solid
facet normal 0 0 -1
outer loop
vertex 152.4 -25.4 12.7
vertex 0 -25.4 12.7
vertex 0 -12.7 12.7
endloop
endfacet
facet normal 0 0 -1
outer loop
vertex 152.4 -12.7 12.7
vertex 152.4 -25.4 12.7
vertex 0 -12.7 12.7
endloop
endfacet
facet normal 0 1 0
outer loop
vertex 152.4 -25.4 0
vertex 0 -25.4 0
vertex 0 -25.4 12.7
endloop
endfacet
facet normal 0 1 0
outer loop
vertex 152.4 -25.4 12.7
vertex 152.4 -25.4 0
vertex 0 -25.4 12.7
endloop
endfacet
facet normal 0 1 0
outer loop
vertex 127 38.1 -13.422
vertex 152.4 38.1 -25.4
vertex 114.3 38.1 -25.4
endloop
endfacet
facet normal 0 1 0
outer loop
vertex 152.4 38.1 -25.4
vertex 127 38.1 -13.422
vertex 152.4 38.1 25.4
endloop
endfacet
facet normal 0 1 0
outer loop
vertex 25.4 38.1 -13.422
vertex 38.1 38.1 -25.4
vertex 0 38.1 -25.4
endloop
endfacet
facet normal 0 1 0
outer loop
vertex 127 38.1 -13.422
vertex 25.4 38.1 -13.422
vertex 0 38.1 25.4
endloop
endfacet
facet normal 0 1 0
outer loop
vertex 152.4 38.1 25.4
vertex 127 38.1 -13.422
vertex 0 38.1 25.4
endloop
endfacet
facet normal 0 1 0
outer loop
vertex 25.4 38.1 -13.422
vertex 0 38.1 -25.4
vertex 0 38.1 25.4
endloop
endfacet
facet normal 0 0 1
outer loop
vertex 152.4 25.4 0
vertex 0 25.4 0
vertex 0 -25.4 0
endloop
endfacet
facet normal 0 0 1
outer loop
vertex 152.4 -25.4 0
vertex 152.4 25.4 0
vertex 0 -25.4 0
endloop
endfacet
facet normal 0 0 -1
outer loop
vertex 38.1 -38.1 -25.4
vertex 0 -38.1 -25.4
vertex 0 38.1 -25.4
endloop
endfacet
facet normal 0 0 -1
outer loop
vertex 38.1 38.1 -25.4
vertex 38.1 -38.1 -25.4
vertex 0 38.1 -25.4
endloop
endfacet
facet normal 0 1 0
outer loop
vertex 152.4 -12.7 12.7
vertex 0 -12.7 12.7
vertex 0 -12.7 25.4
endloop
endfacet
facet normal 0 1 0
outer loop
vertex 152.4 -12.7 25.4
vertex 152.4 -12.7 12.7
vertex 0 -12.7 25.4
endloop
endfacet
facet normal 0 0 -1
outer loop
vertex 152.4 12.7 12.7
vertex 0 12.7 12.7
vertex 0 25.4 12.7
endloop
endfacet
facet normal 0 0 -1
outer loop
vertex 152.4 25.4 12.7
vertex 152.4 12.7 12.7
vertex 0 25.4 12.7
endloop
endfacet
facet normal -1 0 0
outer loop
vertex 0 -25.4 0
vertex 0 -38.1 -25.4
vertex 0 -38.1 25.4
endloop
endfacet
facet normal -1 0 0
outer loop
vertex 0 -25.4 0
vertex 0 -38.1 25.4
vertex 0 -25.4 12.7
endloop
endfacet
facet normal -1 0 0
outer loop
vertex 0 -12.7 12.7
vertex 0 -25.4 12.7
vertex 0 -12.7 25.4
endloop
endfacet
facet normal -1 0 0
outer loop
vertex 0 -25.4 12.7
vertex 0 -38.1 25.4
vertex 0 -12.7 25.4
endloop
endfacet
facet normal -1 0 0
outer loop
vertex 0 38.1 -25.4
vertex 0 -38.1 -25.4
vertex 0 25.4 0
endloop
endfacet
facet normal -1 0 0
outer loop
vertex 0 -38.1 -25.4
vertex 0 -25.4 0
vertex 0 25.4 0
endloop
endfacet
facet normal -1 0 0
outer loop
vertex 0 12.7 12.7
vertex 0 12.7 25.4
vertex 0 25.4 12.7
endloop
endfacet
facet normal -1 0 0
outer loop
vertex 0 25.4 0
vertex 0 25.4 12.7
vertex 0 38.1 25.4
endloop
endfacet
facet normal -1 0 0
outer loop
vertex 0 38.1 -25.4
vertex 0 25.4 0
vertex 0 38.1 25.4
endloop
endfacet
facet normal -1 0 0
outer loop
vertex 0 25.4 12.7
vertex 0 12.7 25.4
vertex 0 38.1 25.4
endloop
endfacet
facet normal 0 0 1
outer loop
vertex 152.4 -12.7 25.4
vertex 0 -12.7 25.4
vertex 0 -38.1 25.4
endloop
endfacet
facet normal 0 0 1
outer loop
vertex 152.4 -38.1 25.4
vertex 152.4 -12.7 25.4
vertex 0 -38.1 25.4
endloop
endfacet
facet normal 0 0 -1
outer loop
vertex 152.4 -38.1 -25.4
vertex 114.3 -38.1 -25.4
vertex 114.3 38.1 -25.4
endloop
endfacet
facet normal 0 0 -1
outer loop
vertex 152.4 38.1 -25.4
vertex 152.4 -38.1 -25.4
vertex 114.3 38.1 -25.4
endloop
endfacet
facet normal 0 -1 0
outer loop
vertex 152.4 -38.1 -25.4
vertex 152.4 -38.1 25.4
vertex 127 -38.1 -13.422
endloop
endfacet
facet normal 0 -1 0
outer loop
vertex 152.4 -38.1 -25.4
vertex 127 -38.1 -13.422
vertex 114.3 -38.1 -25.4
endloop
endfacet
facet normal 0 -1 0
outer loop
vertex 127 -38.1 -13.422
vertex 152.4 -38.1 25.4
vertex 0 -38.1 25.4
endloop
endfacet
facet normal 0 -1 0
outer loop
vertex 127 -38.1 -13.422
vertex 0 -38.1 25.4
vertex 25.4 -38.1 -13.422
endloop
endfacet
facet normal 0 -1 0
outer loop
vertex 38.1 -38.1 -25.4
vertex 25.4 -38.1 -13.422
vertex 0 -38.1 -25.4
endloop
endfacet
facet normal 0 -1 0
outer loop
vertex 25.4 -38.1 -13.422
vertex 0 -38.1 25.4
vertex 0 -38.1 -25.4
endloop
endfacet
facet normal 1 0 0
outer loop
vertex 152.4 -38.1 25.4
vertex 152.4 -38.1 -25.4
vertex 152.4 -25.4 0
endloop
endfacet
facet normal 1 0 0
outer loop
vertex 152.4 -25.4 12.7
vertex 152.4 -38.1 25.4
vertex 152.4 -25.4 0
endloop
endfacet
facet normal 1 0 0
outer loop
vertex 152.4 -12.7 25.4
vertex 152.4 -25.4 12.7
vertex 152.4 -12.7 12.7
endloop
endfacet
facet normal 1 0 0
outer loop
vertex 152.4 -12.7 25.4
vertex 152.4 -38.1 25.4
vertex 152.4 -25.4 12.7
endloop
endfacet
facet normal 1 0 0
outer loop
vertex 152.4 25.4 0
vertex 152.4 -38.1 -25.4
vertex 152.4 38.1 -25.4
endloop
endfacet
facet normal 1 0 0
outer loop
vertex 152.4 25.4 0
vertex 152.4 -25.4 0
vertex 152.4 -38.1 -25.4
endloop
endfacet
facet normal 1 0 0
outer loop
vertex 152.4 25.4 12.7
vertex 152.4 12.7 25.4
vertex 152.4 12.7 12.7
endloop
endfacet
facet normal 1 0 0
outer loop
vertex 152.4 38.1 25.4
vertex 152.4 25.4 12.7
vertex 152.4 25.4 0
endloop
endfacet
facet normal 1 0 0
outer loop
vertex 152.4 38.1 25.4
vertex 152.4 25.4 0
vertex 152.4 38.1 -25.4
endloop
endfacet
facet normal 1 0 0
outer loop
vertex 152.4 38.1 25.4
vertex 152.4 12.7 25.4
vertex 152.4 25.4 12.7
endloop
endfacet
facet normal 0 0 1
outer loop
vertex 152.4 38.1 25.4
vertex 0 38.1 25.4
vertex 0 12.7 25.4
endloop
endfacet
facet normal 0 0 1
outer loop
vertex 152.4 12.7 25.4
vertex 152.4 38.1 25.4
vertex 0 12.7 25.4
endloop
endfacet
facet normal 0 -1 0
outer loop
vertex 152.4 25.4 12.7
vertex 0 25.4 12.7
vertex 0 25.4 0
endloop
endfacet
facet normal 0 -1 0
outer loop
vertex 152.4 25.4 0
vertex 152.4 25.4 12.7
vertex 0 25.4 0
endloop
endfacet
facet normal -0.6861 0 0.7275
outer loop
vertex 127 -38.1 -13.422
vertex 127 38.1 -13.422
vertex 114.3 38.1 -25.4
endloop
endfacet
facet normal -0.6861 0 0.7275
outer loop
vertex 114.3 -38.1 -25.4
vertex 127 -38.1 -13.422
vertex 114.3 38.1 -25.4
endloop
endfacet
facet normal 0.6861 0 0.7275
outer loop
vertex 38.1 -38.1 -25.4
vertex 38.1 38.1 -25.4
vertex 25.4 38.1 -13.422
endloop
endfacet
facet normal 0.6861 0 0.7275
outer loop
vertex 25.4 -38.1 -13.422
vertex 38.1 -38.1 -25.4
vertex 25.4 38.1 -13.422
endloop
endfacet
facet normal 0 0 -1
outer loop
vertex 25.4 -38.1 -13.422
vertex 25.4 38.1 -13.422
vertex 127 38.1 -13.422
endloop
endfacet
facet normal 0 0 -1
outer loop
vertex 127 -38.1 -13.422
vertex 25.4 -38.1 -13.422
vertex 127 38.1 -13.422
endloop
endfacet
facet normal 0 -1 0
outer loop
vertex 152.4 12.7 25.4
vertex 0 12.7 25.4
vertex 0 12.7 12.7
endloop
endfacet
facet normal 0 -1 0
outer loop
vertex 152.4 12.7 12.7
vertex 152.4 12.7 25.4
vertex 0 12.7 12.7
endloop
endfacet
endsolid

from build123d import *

# Parameters (mm, degrees)
F1_DEPTH = 152.4
F3_DEPTH = 76.2
F5_DEPTH = 76.2


with BuildPart() as f1:
    # F0 (on Right) → F1 (new body)
    with BuildSketch(Plane.YZ):
        Polygon((-12.7, 25.4), (-38.1, 25.4), (-38.1, -25.4), (38.1, -25.4), (38.1, 25.4), (12.7, 25.4), (12.7, 12.7), (25.4, 12.7), (25.4, 0), (-25.4, 0), (-25.4, 12.7), (-12.7, 12.7), align=None)
    extrude(amount=F1_DEPTH)

    # F2 (on Front) → F3 (cut)
    with BuildSketch(Plane.XZ):
        Polygon((25.4, -13.421915), (38.1, -25.4), (93.651866, -25.4), (114.3, -25.4), (127, -13.421915), align=None)
    extrude(amount=-F3_DEPTH, mode=Mode.SUBTRACT)

    # F4 (on face) → F5 (cut)
    with BuildSketch(Plane(origin=(0, 0, 0), x_dir=(-1, 0, 0), z_dir=(0, 1, 0))):
        Polygon((-114.3, -25.4), (-38.1, -25.4), (-25.4, -13.421915), (-127, -13.421915), align=None)
    extrude(amount=-F5_DEPTH, mode=Mode.SUBTRACT)


solid = f1.part
